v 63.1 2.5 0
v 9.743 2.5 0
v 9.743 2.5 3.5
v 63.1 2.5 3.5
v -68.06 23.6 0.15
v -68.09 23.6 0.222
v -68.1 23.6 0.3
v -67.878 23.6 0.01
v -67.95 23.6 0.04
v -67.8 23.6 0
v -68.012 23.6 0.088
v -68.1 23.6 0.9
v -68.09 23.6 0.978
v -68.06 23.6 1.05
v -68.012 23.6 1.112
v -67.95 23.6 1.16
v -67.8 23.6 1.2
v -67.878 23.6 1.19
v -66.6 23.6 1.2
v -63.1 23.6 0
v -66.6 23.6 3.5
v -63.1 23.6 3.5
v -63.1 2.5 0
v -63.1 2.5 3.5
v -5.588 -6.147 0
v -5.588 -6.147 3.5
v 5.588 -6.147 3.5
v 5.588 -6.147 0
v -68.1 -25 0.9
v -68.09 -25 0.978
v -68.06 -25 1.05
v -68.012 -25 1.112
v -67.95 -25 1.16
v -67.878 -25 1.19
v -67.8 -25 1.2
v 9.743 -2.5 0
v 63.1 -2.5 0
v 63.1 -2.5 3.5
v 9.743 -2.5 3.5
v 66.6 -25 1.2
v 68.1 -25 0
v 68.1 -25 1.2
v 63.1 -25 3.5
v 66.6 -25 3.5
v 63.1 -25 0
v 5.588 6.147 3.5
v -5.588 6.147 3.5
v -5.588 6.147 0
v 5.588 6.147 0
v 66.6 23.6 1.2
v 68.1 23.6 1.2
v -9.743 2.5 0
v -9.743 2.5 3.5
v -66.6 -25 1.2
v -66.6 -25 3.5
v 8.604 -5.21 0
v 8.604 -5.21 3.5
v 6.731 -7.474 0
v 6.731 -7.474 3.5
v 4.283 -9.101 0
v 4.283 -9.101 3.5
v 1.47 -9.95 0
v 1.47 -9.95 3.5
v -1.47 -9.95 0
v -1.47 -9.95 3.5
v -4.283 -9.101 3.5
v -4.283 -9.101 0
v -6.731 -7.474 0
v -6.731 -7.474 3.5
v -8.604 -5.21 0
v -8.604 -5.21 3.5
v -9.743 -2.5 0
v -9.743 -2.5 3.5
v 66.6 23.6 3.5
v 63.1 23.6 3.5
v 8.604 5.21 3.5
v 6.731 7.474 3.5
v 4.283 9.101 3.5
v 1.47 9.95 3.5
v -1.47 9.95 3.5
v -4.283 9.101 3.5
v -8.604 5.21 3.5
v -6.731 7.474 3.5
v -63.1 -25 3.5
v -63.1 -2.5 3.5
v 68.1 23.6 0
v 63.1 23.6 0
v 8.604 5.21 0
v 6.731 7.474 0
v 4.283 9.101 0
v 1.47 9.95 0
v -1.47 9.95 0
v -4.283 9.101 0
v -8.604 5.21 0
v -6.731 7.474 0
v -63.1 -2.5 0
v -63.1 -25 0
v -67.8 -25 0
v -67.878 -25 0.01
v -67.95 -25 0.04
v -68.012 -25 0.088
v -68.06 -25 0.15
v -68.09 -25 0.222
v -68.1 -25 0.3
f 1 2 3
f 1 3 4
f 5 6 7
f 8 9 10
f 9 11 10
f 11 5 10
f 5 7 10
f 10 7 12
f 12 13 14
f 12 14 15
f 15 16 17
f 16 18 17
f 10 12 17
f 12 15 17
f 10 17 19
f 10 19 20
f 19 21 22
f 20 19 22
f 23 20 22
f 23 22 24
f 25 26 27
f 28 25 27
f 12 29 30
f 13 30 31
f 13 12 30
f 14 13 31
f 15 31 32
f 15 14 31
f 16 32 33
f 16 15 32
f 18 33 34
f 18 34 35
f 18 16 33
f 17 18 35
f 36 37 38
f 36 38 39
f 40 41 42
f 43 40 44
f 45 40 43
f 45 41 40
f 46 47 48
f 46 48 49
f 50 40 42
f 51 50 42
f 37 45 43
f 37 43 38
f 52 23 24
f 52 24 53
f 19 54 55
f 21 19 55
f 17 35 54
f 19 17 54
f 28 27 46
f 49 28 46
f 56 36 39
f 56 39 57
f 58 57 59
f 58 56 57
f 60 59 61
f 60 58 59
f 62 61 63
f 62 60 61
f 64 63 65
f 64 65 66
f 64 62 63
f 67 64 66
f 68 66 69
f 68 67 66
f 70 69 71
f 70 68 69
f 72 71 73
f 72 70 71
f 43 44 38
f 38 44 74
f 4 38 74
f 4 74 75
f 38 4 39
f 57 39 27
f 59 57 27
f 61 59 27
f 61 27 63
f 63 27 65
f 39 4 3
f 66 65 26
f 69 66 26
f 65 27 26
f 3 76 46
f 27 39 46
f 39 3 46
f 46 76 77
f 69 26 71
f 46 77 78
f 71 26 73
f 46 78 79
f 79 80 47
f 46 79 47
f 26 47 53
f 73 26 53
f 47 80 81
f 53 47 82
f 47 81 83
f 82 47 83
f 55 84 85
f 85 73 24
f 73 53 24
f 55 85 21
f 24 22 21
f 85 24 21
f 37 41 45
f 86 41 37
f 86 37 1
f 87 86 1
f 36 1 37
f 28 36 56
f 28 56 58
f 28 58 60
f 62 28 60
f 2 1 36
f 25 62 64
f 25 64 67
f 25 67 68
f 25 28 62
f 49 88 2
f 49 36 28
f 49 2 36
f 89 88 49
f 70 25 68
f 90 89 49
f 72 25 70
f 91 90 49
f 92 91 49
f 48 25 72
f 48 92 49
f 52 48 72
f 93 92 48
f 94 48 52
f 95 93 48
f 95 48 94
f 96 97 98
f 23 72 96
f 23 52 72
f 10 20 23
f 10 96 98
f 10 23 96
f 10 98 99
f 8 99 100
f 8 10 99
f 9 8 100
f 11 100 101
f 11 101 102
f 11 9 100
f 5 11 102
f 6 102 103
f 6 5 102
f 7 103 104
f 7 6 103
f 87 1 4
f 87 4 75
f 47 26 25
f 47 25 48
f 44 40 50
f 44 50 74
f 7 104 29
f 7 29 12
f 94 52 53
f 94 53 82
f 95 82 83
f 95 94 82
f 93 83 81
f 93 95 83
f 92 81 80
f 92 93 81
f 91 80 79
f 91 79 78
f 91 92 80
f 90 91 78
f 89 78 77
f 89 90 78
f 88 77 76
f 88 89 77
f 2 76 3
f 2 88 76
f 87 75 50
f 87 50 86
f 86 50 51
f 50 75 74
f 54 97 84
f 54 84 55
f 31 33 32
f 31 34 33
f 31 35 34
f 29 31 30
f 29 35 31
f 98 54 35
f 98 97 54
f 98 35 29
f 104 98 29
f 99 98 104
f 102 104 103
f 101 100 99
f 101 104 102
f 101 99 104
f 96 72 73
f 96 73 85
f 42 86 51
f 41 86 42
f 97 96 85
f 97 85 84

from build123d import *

# Parameters (mm, degrees)
SKETCH1_R           = 2.54
BOSS_EXTRUDE1_DEPTH = 3.5
SKETCH2_W           = 1.5
SKETCH2_H           = 2.3
CUT_EXTRUDE1_DEPTH  = 51
SKETCH3_W           = 11.176
SKETCH3_H           = 12.2936
CUT_EXTRUDE2_DEPTH  = 3.81
SKETCH4_W           = 136.2
SKETCH4_H           = 1.4
CUT_EXTRUDE3_DEPTH  = 4.5
FILLET1_R           = 0.3


with BuildPart() as part:
    # Sketch1 → Boss-Extrude1 (new body)
    with BuildSketch(Plane.XY):
        with BuildLine():
            Line((-63.1, 2.5), (-9.742761957, 2.5))
            ThreePointArc((-9.742761957, 2.5), (0, 10.0584), (9.742761957, 2.5))
            Line((9.742761957, 2.5), (63.1, 2.5))
            Line((63.1, 2.5), (63.1, 25))
            Line((63.1, 25), (68.1, 25))
            Line((68.1, 25), (68.1, -25))
            Line((68.1, -25), (63.1, -25))
            Line((63.1, -25), (63.1, -2.5))
            Line((63.1, -2.5), (9.742761957, -2.5))
            ThreePointArc((9.742761957, -2.5), (0, -10.0584), (-9.742761957, -2.5))
            Line((-9.742761957, -2.5), (-63.1, -2.5))
            Line((-63.1, -2.5), (-63.1, -25))
            Line((-63.1, -25), (-68.1, -25))
            Line((-68.1, -25), (-68.1, 25))
            Line((-68.1, 25), (-63.1, 25))
            Line((-63.1, 25), (-63.1, 2.5))
        make_face()
        Circle(SKETCH1_R, mode=Mode.SUBTRACT)
    extrude(amount=BOSS_EXTRUDE1_DEPTH)

    # Sketch2 → Cut-Extrude1 (cut, through all)
    with BuildSketch(Plane.XZ.offset(25)):
        with Locations((67.35, 2.35)):
            Rectangle(SKETCH2_W, SKETCH2_H)
        with Locations((-67.35, 2.35)):
            Rectangle(SKETCH2_W, SKETCH2_H)
    extrude(amount=-CUT_EXTRUDE1_DEPTH, mode=Mode.SUBTRACT)

    # Sketch3 → Cut-Extrude2 (cut)
    with BuildSketch(Plane.XY.offset(3.5)):
        Rectangle(SKETCH3_W, SKETCH3_H)
    extrude(amount=-CUT_EXTRUDE2_DEPTH, mode=Mode.SUBTRACT)

    # Sketch4 → Cut-Extrude3 (cut, through all)
    with BuildSketch(Plane.XY.offset(3.5)):
        with Locations((0, 24.3)):
            Rectangle(SKETCH4_W, SKETCH4_H)
    extrude(amount=-CUT_EXTRUDE3_DEPTH, mode=Mode.SUBTRACT)

    # Fillet1
    fillet1_edges = [part.edges().sort_by_distance(p)[0] for p in [
        (-68.1, -0.7, 1.2),
        (-68.1, -0.7, 0),
    ]]
    fillet(fillet1_edges, radius=FILLET1_R)


solid = part.part
